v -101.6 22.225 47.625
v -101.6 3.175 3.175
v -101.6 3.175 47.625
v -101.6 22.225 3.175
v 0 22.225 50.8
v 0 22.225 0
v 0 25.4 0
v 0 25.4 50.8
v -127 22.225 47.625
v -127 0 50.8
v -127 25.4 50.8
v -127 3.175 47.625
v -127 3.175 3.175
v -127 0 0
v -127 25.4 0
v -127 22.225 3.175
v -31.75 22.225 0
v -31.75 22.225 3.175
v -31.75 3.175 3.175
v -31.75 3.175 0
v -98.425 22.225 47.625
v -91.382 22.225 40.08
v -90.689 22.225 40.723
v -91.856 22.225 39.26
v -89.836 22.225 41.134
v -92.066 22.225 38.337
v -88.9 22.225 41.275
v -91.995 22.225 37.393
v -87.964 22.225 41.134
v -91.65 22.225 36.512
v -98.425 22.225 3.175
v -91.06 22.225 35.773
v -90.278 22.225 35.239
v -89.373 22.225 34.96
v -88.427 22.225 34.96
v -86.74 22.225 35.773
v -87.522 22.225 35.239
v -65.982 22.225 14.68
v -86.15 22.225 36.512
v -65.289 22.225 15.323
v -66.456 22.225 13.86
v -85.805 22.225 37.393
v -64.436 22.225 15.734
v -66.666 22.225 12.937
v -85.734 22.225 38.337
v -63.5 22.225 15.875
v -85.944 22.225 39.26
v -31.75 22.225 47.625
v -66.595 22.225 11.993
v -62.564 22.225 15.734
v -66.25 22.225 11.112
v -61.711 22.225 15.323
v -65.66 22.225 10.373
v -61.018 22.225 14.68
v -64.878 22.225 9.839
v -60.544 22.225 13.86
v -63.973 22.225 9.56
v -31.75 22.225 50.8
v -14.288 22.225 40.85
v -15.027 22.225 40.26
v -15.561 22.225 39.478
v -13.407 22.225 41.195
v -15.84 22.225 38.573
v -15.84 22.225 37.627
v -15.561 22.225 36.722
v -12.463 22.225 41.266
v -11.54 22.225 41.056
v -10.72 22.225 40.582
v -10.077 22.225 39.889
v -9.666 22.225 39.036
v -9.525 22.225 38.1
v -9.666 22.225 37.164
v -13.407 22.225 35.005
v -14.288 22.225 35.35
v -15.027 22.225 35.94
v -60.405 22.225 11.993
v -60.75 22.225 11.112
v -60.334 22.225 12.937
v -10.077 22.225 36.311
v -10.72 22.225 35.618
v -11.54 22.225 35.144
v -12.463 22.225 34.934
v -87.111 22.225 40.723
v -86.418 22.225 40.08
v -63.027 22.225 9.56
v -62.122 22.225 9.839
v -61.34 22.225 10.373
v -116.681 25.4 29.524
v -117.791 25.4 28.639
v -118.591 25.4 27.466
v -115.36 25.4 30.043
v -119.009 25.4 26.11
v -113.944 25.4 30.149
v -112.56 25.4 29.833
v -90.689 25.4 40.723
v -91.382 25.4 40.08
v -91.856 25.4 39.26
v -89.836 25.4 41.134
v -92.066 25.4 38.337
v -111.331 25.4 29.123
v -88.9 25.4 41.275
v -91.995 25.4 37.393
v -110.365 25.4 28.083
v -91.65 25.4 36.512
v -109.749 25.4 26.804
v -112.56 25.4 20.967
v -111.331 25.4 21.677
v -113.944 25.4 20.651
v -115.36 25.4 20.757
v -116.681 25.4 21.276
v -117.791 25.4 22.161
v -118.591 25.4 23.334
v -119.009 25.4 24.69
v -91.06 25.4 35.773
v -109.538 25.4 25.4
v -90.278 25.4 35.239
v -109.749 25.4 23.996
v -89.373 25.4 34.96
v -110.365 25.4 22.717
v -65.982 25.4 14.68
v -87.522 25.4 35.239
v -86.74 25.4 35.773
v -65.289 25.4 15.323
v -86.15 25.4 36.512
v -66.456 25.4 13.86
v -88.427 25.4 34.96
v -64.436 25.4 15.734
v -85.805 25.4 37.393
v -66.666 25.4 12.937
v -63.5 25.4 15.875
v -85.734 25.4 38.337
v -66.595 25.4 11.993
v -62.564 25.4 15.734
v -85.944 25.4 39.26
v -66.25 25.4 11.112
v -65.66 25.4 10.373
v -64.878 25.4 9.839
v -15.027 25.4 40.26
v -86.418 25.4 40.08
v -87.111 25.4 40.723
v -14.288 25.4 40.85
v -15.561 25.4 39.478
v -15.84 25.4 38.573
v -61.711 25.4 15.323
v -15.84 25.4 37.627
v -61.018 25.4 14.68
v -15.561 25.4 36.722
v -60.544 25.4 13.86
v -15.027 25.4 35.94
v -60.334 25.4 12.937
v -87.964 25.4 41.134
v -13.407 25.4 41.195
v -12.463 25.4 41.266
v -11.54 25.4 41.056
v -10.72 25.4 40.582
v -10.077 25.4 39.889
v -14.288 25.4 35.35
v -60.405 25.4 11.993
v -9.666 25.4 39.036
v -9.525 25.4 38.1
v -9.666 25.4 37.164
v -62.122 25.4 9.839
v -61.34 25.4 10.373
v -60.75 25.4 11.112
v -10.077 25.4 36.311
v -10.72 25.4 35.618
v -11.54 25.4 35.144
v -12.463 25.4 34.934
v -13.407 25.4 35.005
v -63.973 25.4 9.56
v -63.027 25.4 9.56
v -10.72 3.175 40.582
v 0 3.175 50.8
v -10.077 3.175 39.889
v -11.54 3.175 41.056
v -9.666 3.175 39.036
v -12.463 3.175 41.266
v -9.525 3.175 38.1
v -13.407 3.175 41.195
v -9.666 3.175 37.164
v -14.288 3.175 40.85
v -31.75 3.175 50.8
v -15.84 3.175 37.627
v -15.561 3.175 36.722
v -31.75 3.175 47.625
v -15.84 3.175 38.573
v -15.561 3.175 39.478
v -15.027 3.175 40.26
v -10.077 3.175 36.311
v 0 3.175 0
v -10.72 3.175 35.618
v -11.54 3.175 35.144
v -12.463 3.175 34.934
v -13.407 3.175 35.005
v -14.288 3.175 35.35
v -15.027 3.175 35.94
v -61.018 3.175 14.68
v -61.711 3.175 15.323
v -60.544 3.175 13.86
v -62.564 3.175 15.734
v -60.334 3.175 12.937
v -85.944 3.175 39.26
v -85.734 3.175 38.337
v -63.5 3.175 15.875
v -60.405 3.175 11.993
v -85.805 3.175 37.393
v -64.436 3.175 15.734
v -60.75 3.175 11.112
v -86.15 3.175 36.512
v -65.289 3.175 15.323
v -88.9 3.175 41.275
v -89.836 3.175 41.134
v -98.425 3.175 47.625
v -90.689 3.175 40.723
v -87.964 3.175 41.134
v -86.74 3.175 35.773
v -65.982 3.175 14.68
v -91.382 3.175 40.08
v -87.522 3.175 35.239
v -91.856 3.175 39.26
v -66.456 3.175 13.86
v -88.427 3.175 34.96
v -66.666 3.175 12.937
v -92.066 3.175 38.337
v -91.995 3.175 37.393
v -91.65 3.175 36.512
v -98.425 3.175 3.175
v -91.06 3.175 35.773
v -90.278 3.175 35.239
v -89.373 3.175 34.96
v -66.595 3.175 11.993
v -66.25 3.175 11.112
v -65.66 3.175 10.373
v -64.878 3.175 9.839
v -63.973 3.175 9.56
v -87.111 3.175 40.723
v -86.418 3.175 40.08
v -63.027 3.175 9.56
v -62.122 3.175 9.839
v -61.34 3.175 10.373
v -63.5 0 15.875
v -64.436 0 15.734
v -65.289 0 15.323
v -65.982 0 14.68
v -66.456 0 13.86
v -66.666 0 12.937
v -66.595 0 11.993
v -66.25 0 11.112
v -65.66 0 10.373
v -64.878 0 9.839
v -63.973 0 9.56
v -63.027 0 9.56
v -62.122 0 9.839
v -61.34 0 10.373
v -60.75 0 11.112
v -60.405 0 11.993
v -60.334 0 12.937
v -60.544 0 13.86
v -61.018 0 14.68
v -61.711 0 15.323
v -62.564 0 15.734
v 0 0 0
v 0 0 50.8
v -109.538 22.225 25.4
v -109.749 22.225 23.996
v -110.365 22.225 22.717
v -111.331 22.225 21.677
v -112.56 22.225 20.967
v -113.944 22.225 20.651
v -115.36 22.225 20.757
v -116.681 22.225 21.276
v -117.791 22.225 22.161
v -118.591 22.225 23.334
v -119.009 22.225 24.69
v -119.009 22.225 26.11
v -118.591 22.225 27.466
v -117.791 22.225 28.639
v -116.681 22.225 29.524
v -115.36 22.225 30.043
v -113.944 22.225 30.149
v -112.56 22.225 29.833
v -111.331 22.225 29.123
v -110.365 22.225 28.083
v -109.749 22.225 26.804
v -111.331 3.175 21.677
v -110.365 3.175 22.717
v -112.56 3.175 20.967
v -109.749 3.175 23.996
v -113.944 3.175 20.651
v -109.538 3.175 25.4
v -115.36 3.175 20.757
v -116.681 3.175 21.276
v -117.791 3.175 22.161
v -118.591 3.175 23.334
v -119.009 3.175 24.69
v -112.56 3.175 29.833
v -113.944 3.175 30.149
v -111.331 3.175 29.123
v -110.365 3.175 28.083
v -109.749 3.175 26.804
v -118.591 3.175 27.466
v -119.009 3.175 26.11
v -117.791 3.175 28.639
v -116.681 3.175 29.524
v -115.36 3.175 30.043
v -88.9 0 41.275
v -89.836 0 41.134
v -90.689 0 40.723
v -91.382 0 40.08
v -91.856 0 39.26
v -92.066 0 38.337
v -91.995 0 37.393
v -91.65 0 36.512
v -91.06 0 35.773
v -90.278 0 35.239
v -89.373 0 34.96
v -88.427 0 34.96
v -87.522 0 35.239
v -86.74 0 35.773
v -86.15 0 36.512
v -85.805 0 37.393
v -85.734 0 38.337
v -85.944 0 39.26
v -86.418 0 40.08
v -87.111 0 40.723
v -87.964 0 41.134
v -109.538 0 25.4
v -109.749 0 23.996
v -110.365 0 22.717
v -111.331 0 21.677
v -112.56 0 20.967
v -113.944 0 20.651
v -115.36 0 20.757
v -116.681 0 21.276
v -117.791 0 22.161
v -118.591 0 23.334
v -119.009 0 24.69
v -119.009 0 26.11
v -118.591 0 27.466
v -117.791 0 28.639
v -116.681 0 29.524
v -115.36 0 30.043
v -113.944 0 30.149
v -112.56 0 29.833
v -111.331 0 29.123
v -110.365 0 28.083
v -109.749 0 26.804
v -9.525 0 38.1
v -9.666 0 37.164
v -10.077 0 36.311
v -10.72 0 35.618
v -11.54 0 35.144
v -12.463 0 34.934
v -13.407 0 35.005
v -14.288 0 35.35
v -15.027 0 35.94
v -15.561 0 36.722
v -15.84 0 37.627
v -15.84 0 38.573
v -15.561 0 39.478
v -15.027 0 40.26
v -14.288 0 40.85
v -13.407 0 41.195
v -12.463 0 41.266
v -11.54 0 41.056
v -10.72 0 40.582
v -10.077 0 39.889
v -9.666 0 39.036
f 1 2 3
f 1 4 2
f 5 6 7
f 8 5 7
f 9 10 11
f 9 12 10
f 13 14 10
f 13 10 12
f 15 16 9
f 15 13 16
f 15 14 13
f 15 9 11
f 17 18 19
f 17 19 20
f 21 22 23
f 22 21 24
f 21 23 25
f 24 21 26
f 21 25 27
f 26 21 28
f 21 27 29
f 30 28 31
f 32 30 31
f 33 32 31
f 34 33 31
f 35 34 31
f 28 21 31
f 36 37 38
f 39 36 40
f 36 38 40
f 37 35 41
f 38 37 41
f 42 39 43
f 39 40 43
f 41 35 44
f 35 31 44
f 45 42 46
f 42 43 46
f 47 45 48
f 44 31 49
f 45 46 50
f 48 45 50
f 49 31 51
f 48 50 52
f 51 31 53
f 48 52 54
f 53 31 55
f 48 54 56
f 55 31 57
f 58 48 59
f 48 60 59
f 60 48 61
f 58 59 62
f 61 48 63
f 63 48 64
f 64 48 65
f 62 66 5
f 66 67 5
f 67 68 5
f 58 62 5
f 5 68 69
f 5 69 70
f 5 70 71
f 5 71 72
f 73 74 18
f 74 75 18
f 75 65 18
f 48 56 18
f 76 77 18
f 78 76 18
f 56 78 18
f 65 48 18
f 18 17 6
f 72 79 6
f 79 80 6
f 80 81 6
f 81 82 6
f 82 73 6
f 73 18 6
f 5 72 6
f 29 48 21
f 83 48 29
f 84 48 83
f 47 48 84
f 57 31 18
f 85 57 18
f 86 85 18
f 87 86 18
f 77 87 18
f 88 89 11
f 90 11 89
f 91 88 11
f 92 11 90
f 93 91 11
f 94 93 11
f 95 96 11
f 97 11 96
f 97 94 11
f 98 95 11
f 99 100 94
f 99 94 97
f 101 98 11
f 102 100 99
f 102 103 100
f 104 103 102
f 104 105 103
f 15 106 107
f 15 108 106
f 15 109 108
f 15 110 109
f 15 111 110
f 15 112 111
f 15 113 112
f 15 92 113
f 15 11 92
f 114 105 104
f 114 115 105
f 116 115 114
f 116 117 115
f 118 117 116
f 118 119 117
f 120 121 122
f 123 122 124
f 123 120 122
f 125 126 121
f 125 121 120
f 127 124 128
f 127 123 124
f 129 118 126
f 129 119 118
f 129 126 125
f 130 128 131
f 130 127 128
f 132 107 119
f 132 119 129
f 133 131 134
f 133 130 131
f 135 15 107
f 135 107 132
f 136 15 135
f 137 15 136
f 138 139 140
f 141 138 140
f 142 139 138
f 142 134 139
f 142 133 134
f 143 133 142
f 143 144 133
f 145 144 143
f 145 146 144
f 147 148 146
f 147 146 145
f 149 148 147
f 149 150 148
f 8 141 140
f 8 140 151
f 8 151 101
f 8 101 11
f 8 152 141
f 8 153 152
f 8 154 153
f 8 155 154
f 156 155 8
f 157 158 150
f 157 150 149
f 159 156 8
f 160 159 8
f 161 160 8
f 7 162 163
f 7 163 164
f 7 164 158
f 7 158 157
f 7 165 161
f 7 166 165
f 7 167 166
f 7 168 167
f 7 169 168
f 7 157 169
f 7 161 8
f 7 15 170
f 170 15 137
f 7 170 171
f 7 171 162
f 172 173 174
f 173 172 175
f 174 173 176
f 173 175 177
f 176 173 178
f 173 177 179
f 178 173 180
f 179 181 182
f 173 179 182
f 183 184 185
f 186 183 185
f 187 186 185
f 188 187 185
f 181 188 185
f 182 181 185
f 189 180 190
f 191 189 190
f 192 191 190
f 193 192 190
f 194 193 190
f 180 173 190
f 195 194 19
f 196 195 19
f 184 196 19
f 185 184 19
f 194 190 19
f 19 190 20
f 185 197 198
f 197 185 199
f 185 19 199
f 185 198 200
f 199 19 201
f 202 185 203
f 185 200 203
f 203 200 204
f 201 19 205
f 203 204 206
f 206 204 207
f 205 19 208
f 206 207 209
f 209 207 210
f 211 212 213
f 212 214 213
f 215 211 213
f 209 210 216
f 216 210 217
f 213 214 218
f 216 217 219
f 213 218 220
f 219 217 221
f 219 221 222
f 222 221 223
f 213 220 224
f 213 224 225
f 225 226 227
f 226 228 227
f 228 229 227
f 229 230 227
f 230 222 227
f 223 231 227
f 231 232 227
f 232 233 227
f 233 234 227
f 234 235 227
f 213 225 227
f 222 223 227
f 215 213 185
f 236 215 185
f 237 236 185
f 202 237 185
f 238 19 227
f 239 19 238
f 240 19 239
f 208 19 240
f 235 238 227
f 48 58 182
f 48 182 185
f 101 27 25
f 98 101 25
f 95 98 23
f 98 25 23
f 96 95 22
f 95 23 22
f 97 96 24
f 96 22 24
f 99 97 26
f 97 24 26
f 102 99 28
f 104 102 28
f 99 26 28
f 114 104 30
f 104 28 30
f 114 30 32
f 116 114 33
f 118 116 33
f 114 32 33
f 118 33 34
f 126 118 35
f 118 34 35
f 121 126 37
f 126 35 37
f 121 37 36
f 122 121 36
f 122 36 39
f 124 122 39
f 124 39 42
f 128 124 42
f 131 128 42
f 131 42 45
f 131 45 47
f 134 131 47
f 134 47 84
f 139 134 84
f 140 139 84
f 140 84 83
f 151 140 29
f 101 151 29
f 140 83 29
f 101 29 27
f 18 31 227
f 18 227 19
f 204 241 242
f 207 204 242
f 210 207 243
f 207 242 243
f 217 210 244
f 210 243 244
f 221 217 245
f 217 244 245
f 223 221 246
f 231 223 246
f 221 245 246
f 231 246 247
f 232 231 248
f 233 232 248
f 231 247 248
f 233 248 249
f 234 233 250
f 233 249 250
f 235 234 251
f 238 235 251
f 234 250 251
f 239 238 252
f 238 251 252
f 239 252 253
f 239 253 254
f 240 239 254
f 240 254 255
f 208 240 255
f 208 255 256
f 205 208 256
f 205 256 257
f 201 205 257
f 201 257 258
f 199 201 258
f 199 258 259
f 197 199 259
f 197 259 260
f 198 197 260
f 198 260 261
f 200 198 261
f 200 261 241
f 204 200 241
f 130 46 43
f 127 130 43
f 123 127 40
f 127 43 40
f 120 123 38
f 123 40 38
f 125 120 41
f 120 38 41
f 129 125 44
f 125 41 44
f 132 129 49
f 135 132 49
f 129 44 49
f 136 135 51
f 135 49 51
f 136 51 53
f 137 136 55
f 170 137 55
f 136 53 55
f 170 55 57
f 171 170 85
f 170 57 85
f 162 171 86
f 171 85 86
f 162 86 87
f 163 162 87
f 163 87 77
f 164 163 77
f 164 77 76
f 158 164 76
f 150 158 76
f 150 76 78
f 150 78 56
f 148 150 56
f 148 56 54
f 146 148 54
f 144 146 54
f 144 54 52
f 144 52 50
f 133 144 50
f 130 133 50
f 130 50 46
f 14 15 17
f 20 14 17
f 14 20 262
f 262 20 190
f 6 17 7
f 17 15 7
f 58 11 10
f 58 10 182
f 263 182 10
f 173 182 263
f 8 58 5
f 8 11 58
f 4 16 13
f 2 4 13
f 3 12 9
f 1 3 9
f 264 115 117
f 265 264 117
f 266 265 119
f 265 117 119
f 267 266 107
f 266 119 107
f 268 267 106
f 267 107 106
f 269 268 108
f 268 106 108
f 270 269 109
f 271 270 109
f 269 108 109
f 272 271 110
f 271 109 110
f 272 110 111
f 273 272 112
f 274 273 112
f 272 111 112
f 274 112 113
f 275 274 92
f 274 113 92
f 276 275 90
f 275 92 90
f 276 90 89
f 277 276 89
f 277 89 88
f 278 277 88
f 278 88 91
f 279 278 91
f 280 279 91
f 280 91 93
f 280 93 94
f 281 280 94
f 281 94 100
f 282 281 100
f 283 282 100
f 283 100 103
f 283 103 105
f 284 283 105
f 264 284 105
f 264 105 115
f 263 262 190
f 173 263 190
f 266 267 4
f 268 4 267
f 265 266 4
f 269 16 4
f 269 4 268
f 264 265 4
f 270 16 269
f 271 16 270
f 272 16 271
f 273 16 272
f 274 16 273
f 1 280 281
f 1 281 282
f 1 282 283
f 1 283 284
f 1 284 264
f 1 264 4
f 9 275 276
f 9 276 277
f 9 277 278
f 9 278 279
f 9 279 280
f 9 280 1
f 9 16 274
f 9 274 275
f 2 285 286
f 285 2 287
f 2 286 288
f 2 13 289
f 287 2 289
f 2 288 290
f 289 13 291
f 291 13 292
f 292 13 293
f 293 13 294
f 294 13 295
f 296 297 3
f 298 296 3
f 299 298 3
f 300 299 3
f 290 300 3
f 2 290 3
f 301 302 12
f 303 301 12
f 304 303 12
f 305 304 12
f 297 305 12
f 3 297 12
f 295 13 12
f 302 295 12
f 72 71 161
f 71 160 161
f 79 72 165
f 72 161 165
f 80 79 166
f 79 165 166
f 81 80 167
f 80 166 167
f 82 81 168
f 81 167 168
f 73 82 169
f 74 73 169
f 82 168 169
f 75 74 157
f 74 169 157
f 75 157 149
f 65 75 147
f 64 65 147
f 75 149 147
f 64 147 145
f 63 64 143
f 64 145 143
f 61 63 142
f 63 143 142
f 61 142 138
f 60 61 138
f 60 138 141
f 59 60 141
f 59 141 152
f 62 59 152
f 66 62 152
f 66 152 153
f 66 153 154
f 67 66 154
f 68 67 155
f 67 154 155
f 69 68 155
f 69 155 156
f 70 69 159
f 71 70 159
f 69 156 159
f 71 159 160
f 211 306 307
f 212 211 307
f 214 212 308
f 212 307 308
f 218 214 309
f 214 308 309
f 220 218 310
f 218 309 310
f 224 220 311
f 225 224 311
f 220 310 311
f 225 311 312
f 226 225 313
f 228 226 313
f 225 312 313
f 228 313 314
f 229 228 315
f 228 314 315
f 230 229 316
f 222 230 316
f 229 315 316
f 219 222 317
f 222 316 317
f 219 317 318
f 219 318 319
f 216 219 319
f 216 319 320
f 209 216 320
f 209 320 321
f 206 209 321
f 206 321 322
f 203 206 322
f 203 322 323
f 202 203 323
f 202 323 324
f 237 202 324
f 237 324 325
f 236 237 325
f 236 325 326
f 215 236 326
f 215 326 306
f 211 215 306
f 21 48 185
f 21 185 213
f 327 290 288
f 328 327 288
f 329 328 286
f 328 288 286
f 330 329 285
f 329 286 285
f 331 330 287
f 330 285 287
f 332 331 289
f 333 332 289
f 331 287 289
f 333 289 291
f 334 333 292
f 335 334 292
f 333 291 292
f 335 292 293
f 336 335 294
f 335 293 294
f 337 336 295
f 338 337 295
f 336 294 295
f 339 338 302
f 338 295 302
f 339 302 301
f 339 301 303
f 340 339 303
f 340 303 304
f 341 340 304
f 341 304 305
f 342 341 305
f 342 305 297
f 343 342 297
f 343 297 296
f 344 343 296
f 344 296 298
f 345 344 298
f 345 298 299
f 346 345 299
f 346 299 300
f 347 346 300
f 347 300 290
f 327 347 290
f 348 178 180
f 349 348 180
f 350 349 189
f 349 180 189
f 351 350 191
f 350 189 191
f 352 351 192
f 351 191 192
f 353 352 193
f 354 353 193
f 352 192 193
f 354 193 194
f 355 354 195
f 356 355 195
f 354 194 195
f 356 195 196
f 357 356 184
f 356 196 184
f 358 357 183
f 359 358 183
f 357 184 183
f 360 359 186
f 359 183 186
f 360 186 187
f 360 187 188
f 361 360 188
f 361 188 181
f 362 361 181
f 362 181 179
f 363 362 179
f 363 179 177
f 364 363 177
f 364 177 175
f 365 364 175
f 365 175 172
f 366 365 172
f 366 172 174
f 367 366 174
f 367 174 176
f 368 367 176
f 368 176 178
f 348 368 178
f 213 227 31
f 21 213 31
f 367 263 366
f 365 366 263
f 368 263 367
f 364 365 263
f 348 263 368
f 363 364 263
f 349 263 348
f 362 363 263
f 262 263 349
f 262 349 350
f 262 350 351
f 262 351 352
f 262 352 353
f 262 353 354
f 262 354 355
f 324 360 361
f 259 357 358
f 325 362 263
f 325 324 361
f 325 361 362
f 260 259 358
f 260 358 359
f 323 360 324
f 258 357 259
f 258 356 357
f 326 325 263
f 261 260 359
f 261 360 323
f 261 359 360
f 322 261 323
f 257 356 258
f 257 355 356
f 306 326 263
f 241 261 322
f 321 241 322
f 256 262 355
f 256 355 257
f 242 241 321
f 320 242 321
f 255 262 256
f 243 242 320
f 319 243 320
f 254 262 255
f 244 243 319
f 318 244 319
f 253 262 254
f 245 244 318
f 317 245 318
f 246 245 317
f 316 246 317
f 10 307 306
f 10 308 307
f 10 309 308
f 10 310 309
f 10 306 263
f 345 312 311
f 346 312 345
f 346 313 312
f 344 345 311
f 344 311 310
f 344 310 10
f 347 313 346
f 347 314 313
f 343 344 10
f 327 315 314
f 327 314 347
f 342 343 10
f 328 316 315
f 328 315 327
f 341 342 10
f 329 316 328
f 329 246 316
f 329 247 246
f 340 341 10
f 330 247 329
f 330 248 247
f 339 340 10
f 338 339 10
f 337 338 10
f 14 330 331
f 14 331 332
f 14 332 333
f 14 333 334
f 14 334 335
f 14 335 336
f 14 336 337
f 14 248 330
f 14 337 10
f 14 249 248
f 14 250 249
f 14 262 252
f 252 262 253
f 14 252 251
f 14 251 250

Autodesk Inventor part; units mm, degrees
ref_plane "YZ Plane" through (0, 0, 0) normal (1, 0, 0) x (0, 1, 0)
ref_plane "XZ Plane" through (0, 0, 0) normal (0, 1, 0) x (-1, 0, 0)
ref_plane "XY Plane" through (0, 0, 0) normal (0, 0, 1) x (1, 0, 0)
sketch "Sketch1" plane through (0, 0, 0) normal (0, 0, 1) x (1, 0, 0)
  line L0 (0, 0) -> (-127, 0)
  line L1 (-127, 0) -> (-127, 25.4)
  line L2 (-127, 25.4) -> (0, 25.4)
  line L3 (0, 0) -> (0, 3.175)
  line L4 (0, 3.175) -> (-98.425, 3.175)
  line L5 (-98.425, 3.175) -> (-98.425, 22.225)
  line L6 (-98.425, 22.225) -> (0, 22.225)
  line L7 (0, 22.225) -> (0, 25.4)
  dimension "d0" = 127
  dimension "d1" = 25.4
  dimension "d2" = 3.175
  dimension "d3" = 98.425
  dimension "d4" = 19.05
extrude "Extrusion1" add sketch "Sketch1" along normal blind 50.8
sketch "Sketch2" plane through (-127, 25.4, 0) normal (0, 1, 0) x (1, 0, 0)
  circle A0 centre (114.3, -38.1) radius 3.175
  line L0 (127, 0) -> (127, -50.8) projected
  line L1 (127, -50.8) -> (0, -50.8) projected
  line L2 (0, -50.8) -> (127, -50.8) projected
  line L3 (0, -50.8) -> (95.25, -50.8)
  line L4 (95.25, -50.8) -> (95.25, -47.625)
  line L5 (95.25, -47.625) -> (0, -47.625)
  line L6 (0, -47.625) -> (0, -50.8)
  line L7 (127, 0) -> (0, 0) projected
  line L8 (0, -3.175) -> (95.25, -3.175)
  line L9 (95.25, -3.175) -> (95.25, 0)
  line L10 (95.25, 0) -> (0, 0)
  line L11 (0, 0) -> (0, -3.175)
  circle A1 centre (12.7, -25.4) radius 4.7625
  line L12 (0, 0) -> (0, -50.8) projected
  dimension "d7" = 6.35
  dimension "d8" = 12.7
  dimension "d9" = 12.7
  dimension "d12" = 31.75
  dimension "d13" = 3.175
  dimension "d19" = 9.525
  dimension "d20" = 12.7
  dimension "d21" = 25.4
extrude "Extrusion2" cut sketch "Sketch2" against normal blind 50.8 contours A0 | A1
extrude "Extrusion3" add sketch "Sketch2" against normal blind 25.4 contours L9 L8 L11 L7 | L1 L6 L5 L4
sketch "Sketch3" plane through (-127, 0, 0) normal (-1, 0, 0) x (0, 0, 1)
  line L0 (3.175, 22.225) -> (3.175, 3.175) projected
  line L1 (0, 22.225) -> (50.8, 22.225) projected
  line L2 (3.175, 3.175) -> (47.625, 3.175)
  line L3 (47.625, 3.175) -> (47.625, 22.225)
  line L4 (47.625, 22.225) -> (3.175, 22.225)
  line L5 (3.175, 22.225) -> (3.175, 3.175)
  point P0 (0, 0)
  dimension "d16" = 44.45
extrude "Extrusion4" cut sketch "Sketch3" against normal blind 25.4
sketch "Sketch4" plane through (-127, 25.4, 50.8) normal (0, 1, 0) x (1, 0, 0)
  line L0 (0, 50.8) -> (127, 50.8) projected
  line L1 (127, 0) -> (0, 0) projected
  line L2 (0, 50.8) -> (0, 0) projected
  point P0 (38.1, 12.7)
  point P1 (63.5, 38.1)
  dimension "d22" = 12.7
  dimension "d23" = 12.7
  dimension "d24" = 38.1
  dimension "d25" = 63.5
hole "Hole1" at (-88.9, 25.4, 38.1) at (-63.5, 25.4, 12.7) direction (0, -1, 0) diameter 6.35 end through all
properties part number "15102898-16-P-0203" material "Aluminum 6061"
